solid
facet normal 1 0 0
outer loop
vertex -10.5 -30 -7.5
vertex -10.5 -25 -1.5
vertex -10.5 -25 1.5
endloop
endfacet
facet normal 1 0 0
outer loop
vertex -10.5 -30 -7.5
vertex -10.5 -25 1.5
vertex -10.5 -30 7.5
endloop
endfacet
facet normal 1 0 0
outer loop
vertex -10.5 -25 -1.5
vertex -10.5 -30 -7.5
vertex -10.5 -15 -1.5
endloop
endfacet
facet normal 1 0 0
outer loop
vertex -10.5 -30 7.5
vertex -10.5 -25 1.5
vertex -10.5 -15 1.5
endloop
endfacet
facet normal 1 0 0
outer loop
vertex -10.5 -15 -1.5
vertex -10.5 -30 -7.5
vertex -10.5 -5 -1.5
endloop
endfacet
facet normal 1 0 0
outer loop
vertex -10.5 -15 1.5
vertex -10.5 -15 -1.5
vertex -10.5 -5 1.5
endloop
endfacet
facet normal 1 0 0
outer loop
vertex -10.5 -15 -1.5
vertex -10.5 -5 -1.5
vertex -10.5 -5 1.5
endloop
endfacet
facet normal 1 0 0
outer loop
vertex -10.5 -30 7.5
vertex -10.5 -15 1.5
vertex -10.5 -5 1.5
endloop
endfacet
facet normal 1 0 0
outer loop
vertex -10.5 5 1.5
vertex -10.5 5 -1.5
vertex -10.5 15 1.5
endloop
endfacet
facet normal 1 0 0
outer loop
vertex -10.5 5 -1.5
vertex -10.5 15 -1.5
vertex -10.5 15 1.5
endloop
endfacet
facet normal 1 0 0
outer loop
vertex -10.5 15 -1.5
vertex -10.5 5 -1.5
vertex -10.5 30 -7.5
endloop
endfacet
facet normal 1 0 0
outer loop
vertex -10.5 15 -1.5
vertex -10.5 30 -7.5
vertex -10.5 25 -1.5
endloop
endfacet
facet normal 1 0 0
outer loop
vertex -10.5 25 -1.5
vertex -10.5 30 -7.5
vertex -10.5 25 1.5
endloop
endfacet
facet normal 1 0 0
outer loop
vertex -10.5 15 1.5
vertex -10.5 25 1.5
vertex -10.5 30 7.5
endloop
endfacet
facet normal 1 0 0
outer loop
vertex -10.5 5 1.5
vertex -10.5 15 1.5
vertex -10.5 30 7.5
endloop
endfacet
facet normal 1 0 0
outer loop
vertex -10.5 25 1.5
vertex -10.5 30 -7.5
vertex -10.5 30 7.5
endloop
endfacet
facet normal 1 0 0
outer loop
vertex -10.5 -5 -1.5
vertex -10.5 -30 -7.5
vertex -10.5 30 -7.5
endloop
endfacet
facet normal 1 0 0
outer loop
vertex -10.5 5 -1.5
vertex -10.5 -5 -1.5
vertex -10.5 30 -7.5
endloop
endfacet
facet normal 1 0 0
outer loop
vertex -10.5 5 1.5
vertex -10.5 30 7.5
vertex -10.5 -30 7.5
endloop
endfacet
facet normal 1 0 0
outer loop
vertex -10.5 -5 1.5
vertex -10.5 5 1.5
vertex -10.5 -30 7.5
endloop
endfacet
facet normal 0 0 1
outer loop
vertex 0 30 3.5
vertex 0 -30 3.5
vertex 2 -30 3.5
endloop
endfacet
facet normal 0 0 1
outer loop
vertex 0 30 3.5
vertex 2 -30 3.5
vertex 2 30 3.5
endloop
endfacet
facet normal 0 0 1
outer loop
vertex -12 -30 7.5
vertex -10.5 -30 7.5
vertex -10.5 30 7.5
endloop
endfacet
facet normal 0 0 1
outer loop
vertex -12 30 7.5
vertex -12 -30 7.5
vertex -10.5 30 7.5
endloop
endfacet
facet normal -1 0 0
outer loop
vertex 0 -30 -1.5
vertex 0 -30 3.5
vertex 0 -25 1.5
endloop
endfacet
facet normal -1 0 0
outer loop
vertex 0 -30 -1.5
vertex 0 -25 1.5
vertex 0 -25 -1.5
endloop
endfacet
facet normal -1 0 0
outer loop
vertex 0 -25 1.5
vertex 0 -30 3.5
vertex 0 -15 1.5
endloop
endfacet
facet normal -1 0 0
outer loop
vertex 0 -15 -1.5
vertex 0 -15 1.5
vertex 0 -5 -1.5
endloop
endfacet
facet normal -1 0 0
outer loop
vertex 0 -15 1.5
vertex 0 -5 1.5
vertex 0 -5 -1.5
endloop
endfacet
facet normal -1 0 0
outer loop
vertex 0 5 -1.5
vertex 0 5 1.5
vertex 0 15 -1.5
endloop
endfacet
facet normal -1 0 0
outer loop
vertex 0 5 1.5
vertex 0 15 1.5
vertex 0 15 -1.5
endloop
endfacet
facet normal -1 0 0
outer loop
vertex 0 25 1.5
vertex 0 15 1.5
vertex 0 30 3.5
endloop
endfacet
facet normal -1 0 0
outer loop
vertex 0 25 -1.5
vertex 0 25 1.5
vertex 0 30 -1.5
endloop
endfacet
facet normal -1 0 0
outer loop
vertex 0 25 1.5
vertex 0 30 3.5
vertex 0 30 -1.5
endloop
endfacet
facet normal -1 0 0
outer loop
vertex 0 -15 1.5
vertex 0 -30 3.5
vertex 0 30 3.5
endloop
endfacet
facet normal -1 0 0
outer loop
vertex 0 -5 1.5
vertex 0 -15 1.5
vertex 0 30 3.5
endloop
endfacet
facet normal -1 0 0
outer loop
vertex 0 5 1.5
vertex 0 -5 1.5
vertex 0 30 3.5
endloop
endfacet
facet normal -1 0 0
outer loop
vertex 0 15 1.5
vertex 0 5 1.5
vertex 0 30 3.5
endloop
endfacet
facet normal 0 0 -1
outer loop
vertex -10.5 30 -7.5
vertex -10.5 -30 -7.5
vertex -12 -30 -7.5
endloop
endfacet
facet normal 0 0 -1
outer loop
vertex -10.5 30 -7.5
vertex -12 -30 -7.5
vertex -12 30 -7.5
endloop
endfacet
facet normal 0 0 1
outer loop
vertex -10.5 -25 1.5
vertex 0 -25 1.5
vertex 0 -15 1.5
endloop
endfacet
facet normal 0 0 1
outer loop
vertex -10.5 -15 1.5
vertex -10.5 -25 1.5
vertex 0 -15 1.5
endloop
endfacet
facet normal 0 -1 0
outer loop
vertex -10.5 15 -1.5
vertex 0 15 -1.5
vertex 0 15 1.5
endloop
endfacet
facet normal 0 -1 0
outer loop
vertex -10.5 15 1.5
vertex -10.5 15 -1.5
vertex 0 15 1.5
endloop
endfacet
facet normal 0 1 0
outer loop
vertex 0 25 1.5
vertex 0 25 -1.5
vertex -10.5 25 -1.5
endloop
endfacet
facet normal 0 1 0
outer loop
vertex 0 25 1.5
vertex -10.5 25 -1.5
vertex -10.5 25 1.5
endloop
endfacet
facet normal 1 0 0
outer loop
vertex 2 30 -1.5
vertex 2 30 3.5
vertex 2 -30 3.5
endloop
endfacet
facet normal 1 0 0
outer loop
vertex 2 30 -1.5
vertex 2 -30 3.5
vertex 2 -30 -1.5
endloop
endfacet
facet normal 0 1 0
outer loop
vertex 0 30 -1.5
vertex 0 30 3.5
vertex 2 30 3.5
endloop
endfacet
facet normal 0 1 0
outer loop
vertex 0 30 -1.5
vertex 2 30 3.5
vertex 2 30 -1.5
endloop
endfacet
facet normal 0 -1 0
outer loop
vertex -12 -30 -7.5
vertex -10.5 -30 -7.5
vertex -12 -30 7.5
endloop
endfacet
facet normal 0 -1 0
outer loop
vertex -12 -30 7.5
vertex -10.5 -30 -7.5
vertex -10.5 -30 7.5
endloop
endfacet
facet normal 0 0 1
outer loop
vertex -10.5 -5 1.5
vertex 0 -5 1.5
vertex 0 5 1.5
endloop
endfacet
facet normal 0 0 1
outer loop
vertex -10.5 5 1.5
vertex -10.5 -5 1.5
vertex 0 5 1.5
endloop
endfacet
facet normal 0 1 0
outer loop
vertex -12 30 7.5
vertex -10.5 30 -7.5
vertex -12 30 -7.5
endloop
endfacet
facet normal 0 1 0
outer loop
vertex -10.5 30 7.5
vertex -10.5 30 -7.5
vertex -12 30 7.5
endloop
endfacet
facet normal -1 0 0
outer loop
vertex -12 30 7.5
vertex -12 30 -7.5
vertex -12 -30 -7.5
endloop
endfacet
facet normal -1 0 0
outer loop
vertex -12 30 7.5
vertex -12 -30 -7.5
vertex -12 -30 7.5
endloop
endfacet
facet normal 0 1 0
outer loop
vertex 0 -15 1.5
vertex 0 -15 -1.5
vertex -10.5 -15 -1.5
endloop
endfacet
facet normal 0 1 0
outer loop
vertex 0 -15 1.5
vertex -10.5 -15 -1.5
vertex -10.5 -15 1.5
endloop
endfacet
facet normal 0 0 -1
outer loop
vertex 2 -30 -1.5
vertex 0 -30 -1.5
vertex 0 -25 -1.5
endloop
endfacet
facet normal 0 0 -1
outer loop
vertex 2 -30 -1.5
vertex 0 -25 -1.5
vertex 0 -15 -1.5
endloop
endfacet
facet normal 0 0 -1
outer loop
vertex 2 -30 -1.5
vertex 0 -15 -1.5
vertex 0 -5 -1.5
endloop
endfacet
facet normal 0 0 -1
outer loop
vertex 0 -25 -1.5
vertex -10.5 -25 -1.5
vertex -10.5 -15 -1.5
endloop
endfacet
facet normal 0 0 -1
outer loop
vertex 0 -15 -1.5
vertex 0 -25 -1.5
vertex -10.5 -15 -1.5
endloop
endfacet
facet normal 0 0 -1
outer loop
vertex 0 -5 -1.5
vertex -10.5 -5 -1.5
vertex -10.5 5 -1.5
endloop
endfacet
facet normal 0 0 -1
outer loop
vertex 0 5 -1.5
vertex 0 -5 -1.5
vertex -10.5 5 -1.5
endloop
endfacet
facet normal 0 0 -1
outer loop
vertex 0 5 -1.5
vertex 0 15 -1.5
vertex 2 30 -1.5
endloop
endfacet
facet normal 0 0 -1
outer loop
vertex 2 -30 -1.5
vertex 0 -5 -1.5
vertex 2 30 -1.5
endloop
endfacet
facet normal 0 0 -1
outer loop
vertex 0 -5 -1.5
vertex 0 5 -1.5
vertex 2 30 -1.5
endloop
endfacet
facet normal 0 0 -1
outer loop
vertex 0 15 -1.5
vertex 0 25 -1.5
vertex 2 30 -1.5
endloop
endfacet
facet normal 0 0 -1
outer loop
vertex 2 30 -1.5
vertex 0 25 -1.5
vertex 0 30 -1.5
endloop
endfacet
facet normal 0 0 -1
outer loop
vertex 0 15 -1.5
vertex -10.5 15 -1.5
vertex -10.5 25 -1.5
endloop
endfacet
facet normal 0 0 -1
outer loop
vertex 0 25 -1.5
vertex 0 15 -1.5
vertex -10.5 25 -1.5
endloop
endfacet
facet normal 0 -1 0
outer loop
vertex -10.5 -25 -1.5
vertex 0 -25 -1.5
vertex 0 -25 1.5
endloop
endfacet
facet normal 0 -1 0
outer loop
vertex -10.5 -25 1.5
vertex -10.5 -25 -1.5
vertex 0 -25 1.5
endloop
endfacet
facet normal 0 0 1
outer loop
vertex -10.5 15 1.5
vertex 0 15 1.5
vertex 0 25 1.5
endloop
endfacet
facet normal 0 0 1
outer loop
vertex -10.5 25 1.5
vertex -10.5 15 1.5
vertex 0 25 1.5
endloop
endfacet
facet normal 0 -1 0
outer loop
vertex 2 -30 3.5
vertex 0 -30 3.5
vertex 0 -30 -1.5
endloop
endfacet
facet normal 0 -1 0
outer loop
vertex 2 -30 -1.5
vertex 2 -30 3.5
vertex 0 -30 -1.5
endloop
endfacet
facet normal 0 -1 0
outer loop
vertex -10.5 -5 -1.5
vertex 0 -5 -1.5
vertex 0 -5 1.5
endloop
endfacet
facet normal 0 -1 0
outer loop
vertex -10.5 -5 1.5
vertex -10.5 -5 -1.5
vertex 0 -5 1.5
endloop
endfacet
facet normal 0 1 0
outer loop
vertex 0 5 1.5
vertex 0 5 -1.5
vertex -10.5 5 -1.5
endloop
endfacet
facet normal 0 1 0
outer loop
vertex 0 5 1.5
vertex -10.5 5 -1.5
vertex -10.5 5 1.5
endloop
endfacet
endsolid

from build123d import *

# Parameters (mm, degrees)
SKETCH_1_W      = 5
SKETCH_1_H      = 60
EXTRUDE_1_DEPTH = 2
SKETCH_2_W      = 3
SKETCH_2_H      = 10
EXTRUDE_2_DEPTH = 10.5
SKETCH_3_W      = 15
SKETCH_3_H      = 60
EXTRUDE_3_DEPTH = 1.5


with BuildPart() as part:
    # 草图1 → 凸台-拉伸1 (new body)
    with BuildSketch(Plane(origin=(0, 0, 0), x_dir=(0, 0, -1), z_dir=(1, 0, 0))):
        with Locations((-1, 0)):
            Rectangle(SKETCH_1_W, SKETCH_1_H)
    extrude(amount=EXTRUDE_1_DEPTH)

    # 草图2 → 凸台-拉伸2 (add)
    with BuildSketch(Plane.ZY):
        with Locations((0, 20)):
            Rectangle(SKETCH_2_W, SKETCH_2_H)
        Rectangle(SKETCH_2_W, SKETCH_2_H)
        with Locations((0, -20)):
            Rectangle(SKETCH_2_W, SKETCH_2_H)
    extrude(amount=EXTRUDE_2_DEPTH)

    # 草图3 → 凸台-拉伸3 (add)
    with BuildSketch(Plane.ZY.offset(10.5)):
        Rectangle(SKETCH_3_W, SKETCH_3_H)
    extrude(amount=EXTRUDE_3_DEPTH)


solid = part.part
